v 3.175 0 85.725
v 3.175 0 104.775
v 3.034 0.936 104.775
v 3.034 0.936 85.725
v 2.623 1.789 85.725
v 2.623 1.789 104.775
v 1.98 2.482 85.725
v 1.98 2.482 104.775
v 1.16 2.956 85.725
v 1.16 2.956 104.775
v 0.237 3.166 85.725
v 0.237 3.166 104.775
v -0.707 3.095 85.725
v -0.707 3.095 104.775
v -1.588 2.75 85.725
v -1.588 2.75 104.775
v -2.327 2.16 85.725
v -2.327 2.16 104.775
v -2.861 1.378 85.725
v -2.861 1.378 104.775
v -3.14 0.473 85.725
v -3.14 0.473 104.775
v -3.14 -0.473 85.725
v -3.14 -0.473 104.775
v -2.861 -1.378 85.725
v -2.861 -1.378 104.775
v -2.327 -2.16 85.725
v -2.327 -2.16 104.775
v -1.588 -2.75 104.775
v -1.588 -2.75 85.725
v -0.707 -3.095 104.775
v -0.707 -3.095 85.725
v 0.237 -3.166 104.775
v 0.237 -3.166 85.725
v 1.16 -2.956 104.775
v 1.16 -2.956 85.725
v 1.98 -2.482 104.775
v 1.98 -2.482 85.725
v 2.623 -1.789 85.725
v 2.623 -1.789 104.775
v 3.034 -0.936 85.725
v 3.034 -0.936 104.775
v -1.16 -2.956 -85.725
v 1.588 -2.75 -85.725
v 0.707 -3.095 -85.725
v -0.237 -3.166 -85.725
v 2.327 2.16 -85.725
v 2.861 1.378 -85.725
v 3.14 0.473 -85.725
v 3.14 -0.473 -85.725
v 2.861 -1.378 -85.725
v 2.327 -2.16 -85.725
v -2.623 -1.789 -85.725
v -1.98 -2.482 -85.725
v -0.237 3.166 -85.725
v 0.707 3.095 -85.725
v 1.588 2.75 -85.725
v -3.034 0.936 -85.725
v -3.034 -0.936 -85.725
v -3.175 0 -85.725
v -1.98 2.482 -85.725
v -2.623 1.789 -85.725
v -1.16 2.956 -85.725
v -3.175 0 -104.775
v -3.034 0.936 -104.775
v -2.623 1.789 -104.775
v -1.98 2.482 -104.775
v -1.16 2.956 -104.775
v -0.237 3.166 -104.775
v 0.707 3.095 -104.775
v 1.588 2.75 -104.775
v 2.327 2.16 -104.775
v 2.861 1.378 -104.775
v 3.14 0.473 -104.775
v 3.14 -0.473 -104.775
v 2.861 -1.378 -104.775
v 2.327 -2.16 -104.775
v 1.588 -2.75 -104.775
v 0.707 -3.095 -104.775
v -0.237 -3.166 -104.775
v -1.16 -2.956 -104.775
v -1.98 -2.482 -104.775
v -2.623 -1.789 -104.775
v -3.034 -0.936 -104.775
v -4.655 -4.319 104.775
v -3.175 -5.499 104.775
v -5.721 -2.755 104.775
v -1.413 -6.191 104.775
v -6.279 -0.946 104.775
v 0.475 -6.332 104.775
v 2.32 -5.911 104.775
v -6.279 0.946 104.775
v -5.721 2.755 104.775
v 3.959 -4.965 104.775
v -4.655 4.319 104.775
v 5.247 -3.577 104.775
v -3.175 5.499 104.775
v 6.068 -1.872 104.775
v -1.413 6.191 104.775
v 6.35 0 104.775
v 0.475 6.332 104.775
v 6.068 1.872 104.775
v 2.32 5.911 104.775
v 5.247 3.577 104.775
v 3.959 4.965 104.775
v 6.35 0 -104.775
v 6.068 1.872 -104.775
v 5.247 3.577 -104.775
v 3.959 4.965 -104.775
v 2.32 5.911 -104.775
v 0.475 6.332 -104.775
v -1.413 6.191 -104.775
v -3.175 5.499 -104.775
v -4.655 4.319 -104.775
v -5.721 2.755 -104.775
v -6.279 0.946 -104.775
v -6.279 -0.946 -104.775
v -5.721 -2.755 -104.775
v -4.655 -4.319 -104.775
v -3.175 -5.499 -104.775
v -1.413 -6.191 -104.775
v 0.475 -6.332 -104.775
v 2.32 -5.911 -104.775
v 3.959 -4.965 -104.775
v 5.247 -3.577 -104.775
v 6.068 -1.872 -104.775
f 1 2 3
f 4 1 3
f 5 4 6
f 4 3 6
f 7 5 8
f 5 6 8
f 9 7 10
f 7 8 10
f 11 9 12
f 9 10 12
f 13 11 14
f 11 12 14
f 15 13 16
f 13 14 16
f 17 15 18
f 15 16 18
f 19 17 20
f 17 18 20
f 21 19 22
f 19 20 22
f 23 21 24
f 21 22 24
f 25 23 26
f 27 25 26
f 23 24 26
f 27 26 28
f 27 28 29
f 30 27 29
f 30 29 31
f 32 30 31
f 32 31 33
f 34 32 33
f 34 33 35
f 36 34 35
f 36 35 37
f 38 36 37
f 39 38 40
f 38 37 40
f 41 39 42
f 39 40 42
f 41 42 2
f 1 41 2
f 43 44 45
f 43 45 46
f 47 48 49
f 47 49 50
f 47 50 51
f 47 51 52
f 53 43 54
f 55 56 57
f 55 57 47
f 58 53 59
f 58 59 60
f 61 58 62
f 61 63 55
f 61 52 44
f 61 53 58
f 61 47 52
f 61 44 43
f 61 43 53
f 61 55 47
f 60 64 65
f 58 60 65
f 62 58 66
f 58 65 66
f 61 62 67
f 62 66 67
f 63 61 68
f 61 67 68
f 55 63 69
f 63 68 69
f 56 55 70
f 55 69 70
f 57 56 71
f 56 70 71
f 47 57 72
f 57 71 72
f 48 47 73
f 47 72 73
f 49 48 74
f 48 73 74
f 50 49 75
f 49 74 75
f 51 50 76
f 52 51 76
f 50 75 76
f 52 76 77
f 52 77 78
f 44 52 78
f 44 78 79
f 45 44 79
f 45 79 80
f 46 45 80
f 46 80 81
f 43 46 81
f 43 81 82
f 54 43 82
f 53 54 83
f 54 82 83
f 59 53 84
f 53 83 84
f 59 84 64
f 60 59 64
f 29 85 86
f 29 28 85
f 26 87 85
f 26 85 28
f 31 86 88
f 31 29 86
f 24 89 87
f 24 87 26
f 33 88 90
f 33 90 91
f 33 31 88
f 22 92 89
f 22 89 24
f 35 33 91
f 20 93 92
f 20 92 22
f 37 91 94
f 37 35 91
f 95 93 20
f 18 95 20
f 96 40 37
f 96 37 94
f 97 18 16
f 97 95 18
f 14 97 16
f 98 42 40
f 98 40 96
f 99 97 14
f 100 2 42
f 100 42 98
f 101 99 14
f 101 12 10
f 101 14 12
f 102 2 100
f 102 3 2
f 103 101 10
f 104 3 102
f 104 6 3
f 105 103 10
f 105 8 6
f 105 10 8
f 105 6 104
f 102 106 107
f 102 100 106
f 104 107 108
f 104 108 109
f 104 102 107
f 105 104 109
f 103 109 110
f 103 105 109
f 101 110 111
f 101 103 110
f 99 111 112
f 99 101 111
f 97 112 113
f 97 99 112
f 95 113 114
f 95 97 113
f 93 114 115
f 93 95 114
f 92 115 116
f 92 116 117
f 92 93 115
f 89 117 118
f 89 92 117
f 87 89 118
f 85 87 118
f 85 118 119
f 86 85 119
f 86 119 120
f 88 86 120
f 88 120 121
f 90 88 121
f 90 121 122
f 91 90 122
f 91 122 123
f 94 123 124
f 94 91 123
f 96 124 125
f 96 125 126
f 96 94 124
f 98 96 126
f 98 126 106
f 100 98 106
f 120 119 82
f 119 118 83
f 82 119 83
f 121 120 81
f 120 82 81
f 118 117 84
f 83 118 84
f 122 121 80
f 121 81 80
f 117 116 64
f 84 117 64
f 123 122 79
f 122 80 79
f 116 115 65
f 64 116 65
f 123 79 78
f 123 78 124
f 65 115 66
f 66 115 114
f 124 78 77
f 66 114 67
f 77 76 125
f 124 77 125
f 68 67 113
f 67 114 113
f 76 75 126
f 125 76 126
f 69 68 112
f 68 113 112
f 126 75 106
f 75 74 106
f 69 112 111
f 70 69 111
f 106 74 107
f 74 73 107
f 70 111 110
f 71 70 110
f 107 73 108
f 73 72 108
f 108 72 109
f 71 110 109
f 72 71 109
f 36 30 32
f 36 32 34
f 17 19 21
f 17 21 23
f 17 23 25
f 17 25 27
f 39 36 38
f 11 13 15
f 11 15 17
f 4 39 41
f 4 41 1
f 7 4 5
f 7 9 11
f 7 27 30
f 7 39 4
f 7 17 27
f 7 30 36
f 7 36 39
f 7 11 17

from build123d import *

# Parameters (mm, degrees)
SKETCH1_R           = 6.35
BOSS_EXTRUDE1_DEPTH = 104.775
SKETCH3_R           = 3.175
CUT_EXTRUDE1_DEPTH  = 19.05
SKETCH2_R           = 3.175
CUT_EXTRUDE2_DEPTH  = 19.05


with BuildPart() as part:
    # Sketch1 → Boss-Extrude1 (new body, symmetric)
    with BuildSketch(Plane.XY):
        Circle(SKETCH1_R)
    extrude(amount=BOSS_EXTRUDE1_DEPTH, both=True)

    # Sketch3 → Cut-Extrude1 (cut)
    with BuildSketch(Plane(origin=(0, 0, -104.775), x_dir=(-1, 0, 0), z_dir=(0, 0, -1))):
        Circle(SKETCH3_R)
    extrude(amount=-CUT_EXTRUDE1_DEPTH, mode=Mode.SUBTRACT)

    # Sketch2 → Cut-Extrude2 (cut)
    with BuildSketch(Plane.XY.offset(104.775)):
        Circle(SKETCH2_R)
    extrude(amount=-CUT_EXTRUDE2_DEPTH, mode=Mode.SUBTRACT)


solid = part.part
